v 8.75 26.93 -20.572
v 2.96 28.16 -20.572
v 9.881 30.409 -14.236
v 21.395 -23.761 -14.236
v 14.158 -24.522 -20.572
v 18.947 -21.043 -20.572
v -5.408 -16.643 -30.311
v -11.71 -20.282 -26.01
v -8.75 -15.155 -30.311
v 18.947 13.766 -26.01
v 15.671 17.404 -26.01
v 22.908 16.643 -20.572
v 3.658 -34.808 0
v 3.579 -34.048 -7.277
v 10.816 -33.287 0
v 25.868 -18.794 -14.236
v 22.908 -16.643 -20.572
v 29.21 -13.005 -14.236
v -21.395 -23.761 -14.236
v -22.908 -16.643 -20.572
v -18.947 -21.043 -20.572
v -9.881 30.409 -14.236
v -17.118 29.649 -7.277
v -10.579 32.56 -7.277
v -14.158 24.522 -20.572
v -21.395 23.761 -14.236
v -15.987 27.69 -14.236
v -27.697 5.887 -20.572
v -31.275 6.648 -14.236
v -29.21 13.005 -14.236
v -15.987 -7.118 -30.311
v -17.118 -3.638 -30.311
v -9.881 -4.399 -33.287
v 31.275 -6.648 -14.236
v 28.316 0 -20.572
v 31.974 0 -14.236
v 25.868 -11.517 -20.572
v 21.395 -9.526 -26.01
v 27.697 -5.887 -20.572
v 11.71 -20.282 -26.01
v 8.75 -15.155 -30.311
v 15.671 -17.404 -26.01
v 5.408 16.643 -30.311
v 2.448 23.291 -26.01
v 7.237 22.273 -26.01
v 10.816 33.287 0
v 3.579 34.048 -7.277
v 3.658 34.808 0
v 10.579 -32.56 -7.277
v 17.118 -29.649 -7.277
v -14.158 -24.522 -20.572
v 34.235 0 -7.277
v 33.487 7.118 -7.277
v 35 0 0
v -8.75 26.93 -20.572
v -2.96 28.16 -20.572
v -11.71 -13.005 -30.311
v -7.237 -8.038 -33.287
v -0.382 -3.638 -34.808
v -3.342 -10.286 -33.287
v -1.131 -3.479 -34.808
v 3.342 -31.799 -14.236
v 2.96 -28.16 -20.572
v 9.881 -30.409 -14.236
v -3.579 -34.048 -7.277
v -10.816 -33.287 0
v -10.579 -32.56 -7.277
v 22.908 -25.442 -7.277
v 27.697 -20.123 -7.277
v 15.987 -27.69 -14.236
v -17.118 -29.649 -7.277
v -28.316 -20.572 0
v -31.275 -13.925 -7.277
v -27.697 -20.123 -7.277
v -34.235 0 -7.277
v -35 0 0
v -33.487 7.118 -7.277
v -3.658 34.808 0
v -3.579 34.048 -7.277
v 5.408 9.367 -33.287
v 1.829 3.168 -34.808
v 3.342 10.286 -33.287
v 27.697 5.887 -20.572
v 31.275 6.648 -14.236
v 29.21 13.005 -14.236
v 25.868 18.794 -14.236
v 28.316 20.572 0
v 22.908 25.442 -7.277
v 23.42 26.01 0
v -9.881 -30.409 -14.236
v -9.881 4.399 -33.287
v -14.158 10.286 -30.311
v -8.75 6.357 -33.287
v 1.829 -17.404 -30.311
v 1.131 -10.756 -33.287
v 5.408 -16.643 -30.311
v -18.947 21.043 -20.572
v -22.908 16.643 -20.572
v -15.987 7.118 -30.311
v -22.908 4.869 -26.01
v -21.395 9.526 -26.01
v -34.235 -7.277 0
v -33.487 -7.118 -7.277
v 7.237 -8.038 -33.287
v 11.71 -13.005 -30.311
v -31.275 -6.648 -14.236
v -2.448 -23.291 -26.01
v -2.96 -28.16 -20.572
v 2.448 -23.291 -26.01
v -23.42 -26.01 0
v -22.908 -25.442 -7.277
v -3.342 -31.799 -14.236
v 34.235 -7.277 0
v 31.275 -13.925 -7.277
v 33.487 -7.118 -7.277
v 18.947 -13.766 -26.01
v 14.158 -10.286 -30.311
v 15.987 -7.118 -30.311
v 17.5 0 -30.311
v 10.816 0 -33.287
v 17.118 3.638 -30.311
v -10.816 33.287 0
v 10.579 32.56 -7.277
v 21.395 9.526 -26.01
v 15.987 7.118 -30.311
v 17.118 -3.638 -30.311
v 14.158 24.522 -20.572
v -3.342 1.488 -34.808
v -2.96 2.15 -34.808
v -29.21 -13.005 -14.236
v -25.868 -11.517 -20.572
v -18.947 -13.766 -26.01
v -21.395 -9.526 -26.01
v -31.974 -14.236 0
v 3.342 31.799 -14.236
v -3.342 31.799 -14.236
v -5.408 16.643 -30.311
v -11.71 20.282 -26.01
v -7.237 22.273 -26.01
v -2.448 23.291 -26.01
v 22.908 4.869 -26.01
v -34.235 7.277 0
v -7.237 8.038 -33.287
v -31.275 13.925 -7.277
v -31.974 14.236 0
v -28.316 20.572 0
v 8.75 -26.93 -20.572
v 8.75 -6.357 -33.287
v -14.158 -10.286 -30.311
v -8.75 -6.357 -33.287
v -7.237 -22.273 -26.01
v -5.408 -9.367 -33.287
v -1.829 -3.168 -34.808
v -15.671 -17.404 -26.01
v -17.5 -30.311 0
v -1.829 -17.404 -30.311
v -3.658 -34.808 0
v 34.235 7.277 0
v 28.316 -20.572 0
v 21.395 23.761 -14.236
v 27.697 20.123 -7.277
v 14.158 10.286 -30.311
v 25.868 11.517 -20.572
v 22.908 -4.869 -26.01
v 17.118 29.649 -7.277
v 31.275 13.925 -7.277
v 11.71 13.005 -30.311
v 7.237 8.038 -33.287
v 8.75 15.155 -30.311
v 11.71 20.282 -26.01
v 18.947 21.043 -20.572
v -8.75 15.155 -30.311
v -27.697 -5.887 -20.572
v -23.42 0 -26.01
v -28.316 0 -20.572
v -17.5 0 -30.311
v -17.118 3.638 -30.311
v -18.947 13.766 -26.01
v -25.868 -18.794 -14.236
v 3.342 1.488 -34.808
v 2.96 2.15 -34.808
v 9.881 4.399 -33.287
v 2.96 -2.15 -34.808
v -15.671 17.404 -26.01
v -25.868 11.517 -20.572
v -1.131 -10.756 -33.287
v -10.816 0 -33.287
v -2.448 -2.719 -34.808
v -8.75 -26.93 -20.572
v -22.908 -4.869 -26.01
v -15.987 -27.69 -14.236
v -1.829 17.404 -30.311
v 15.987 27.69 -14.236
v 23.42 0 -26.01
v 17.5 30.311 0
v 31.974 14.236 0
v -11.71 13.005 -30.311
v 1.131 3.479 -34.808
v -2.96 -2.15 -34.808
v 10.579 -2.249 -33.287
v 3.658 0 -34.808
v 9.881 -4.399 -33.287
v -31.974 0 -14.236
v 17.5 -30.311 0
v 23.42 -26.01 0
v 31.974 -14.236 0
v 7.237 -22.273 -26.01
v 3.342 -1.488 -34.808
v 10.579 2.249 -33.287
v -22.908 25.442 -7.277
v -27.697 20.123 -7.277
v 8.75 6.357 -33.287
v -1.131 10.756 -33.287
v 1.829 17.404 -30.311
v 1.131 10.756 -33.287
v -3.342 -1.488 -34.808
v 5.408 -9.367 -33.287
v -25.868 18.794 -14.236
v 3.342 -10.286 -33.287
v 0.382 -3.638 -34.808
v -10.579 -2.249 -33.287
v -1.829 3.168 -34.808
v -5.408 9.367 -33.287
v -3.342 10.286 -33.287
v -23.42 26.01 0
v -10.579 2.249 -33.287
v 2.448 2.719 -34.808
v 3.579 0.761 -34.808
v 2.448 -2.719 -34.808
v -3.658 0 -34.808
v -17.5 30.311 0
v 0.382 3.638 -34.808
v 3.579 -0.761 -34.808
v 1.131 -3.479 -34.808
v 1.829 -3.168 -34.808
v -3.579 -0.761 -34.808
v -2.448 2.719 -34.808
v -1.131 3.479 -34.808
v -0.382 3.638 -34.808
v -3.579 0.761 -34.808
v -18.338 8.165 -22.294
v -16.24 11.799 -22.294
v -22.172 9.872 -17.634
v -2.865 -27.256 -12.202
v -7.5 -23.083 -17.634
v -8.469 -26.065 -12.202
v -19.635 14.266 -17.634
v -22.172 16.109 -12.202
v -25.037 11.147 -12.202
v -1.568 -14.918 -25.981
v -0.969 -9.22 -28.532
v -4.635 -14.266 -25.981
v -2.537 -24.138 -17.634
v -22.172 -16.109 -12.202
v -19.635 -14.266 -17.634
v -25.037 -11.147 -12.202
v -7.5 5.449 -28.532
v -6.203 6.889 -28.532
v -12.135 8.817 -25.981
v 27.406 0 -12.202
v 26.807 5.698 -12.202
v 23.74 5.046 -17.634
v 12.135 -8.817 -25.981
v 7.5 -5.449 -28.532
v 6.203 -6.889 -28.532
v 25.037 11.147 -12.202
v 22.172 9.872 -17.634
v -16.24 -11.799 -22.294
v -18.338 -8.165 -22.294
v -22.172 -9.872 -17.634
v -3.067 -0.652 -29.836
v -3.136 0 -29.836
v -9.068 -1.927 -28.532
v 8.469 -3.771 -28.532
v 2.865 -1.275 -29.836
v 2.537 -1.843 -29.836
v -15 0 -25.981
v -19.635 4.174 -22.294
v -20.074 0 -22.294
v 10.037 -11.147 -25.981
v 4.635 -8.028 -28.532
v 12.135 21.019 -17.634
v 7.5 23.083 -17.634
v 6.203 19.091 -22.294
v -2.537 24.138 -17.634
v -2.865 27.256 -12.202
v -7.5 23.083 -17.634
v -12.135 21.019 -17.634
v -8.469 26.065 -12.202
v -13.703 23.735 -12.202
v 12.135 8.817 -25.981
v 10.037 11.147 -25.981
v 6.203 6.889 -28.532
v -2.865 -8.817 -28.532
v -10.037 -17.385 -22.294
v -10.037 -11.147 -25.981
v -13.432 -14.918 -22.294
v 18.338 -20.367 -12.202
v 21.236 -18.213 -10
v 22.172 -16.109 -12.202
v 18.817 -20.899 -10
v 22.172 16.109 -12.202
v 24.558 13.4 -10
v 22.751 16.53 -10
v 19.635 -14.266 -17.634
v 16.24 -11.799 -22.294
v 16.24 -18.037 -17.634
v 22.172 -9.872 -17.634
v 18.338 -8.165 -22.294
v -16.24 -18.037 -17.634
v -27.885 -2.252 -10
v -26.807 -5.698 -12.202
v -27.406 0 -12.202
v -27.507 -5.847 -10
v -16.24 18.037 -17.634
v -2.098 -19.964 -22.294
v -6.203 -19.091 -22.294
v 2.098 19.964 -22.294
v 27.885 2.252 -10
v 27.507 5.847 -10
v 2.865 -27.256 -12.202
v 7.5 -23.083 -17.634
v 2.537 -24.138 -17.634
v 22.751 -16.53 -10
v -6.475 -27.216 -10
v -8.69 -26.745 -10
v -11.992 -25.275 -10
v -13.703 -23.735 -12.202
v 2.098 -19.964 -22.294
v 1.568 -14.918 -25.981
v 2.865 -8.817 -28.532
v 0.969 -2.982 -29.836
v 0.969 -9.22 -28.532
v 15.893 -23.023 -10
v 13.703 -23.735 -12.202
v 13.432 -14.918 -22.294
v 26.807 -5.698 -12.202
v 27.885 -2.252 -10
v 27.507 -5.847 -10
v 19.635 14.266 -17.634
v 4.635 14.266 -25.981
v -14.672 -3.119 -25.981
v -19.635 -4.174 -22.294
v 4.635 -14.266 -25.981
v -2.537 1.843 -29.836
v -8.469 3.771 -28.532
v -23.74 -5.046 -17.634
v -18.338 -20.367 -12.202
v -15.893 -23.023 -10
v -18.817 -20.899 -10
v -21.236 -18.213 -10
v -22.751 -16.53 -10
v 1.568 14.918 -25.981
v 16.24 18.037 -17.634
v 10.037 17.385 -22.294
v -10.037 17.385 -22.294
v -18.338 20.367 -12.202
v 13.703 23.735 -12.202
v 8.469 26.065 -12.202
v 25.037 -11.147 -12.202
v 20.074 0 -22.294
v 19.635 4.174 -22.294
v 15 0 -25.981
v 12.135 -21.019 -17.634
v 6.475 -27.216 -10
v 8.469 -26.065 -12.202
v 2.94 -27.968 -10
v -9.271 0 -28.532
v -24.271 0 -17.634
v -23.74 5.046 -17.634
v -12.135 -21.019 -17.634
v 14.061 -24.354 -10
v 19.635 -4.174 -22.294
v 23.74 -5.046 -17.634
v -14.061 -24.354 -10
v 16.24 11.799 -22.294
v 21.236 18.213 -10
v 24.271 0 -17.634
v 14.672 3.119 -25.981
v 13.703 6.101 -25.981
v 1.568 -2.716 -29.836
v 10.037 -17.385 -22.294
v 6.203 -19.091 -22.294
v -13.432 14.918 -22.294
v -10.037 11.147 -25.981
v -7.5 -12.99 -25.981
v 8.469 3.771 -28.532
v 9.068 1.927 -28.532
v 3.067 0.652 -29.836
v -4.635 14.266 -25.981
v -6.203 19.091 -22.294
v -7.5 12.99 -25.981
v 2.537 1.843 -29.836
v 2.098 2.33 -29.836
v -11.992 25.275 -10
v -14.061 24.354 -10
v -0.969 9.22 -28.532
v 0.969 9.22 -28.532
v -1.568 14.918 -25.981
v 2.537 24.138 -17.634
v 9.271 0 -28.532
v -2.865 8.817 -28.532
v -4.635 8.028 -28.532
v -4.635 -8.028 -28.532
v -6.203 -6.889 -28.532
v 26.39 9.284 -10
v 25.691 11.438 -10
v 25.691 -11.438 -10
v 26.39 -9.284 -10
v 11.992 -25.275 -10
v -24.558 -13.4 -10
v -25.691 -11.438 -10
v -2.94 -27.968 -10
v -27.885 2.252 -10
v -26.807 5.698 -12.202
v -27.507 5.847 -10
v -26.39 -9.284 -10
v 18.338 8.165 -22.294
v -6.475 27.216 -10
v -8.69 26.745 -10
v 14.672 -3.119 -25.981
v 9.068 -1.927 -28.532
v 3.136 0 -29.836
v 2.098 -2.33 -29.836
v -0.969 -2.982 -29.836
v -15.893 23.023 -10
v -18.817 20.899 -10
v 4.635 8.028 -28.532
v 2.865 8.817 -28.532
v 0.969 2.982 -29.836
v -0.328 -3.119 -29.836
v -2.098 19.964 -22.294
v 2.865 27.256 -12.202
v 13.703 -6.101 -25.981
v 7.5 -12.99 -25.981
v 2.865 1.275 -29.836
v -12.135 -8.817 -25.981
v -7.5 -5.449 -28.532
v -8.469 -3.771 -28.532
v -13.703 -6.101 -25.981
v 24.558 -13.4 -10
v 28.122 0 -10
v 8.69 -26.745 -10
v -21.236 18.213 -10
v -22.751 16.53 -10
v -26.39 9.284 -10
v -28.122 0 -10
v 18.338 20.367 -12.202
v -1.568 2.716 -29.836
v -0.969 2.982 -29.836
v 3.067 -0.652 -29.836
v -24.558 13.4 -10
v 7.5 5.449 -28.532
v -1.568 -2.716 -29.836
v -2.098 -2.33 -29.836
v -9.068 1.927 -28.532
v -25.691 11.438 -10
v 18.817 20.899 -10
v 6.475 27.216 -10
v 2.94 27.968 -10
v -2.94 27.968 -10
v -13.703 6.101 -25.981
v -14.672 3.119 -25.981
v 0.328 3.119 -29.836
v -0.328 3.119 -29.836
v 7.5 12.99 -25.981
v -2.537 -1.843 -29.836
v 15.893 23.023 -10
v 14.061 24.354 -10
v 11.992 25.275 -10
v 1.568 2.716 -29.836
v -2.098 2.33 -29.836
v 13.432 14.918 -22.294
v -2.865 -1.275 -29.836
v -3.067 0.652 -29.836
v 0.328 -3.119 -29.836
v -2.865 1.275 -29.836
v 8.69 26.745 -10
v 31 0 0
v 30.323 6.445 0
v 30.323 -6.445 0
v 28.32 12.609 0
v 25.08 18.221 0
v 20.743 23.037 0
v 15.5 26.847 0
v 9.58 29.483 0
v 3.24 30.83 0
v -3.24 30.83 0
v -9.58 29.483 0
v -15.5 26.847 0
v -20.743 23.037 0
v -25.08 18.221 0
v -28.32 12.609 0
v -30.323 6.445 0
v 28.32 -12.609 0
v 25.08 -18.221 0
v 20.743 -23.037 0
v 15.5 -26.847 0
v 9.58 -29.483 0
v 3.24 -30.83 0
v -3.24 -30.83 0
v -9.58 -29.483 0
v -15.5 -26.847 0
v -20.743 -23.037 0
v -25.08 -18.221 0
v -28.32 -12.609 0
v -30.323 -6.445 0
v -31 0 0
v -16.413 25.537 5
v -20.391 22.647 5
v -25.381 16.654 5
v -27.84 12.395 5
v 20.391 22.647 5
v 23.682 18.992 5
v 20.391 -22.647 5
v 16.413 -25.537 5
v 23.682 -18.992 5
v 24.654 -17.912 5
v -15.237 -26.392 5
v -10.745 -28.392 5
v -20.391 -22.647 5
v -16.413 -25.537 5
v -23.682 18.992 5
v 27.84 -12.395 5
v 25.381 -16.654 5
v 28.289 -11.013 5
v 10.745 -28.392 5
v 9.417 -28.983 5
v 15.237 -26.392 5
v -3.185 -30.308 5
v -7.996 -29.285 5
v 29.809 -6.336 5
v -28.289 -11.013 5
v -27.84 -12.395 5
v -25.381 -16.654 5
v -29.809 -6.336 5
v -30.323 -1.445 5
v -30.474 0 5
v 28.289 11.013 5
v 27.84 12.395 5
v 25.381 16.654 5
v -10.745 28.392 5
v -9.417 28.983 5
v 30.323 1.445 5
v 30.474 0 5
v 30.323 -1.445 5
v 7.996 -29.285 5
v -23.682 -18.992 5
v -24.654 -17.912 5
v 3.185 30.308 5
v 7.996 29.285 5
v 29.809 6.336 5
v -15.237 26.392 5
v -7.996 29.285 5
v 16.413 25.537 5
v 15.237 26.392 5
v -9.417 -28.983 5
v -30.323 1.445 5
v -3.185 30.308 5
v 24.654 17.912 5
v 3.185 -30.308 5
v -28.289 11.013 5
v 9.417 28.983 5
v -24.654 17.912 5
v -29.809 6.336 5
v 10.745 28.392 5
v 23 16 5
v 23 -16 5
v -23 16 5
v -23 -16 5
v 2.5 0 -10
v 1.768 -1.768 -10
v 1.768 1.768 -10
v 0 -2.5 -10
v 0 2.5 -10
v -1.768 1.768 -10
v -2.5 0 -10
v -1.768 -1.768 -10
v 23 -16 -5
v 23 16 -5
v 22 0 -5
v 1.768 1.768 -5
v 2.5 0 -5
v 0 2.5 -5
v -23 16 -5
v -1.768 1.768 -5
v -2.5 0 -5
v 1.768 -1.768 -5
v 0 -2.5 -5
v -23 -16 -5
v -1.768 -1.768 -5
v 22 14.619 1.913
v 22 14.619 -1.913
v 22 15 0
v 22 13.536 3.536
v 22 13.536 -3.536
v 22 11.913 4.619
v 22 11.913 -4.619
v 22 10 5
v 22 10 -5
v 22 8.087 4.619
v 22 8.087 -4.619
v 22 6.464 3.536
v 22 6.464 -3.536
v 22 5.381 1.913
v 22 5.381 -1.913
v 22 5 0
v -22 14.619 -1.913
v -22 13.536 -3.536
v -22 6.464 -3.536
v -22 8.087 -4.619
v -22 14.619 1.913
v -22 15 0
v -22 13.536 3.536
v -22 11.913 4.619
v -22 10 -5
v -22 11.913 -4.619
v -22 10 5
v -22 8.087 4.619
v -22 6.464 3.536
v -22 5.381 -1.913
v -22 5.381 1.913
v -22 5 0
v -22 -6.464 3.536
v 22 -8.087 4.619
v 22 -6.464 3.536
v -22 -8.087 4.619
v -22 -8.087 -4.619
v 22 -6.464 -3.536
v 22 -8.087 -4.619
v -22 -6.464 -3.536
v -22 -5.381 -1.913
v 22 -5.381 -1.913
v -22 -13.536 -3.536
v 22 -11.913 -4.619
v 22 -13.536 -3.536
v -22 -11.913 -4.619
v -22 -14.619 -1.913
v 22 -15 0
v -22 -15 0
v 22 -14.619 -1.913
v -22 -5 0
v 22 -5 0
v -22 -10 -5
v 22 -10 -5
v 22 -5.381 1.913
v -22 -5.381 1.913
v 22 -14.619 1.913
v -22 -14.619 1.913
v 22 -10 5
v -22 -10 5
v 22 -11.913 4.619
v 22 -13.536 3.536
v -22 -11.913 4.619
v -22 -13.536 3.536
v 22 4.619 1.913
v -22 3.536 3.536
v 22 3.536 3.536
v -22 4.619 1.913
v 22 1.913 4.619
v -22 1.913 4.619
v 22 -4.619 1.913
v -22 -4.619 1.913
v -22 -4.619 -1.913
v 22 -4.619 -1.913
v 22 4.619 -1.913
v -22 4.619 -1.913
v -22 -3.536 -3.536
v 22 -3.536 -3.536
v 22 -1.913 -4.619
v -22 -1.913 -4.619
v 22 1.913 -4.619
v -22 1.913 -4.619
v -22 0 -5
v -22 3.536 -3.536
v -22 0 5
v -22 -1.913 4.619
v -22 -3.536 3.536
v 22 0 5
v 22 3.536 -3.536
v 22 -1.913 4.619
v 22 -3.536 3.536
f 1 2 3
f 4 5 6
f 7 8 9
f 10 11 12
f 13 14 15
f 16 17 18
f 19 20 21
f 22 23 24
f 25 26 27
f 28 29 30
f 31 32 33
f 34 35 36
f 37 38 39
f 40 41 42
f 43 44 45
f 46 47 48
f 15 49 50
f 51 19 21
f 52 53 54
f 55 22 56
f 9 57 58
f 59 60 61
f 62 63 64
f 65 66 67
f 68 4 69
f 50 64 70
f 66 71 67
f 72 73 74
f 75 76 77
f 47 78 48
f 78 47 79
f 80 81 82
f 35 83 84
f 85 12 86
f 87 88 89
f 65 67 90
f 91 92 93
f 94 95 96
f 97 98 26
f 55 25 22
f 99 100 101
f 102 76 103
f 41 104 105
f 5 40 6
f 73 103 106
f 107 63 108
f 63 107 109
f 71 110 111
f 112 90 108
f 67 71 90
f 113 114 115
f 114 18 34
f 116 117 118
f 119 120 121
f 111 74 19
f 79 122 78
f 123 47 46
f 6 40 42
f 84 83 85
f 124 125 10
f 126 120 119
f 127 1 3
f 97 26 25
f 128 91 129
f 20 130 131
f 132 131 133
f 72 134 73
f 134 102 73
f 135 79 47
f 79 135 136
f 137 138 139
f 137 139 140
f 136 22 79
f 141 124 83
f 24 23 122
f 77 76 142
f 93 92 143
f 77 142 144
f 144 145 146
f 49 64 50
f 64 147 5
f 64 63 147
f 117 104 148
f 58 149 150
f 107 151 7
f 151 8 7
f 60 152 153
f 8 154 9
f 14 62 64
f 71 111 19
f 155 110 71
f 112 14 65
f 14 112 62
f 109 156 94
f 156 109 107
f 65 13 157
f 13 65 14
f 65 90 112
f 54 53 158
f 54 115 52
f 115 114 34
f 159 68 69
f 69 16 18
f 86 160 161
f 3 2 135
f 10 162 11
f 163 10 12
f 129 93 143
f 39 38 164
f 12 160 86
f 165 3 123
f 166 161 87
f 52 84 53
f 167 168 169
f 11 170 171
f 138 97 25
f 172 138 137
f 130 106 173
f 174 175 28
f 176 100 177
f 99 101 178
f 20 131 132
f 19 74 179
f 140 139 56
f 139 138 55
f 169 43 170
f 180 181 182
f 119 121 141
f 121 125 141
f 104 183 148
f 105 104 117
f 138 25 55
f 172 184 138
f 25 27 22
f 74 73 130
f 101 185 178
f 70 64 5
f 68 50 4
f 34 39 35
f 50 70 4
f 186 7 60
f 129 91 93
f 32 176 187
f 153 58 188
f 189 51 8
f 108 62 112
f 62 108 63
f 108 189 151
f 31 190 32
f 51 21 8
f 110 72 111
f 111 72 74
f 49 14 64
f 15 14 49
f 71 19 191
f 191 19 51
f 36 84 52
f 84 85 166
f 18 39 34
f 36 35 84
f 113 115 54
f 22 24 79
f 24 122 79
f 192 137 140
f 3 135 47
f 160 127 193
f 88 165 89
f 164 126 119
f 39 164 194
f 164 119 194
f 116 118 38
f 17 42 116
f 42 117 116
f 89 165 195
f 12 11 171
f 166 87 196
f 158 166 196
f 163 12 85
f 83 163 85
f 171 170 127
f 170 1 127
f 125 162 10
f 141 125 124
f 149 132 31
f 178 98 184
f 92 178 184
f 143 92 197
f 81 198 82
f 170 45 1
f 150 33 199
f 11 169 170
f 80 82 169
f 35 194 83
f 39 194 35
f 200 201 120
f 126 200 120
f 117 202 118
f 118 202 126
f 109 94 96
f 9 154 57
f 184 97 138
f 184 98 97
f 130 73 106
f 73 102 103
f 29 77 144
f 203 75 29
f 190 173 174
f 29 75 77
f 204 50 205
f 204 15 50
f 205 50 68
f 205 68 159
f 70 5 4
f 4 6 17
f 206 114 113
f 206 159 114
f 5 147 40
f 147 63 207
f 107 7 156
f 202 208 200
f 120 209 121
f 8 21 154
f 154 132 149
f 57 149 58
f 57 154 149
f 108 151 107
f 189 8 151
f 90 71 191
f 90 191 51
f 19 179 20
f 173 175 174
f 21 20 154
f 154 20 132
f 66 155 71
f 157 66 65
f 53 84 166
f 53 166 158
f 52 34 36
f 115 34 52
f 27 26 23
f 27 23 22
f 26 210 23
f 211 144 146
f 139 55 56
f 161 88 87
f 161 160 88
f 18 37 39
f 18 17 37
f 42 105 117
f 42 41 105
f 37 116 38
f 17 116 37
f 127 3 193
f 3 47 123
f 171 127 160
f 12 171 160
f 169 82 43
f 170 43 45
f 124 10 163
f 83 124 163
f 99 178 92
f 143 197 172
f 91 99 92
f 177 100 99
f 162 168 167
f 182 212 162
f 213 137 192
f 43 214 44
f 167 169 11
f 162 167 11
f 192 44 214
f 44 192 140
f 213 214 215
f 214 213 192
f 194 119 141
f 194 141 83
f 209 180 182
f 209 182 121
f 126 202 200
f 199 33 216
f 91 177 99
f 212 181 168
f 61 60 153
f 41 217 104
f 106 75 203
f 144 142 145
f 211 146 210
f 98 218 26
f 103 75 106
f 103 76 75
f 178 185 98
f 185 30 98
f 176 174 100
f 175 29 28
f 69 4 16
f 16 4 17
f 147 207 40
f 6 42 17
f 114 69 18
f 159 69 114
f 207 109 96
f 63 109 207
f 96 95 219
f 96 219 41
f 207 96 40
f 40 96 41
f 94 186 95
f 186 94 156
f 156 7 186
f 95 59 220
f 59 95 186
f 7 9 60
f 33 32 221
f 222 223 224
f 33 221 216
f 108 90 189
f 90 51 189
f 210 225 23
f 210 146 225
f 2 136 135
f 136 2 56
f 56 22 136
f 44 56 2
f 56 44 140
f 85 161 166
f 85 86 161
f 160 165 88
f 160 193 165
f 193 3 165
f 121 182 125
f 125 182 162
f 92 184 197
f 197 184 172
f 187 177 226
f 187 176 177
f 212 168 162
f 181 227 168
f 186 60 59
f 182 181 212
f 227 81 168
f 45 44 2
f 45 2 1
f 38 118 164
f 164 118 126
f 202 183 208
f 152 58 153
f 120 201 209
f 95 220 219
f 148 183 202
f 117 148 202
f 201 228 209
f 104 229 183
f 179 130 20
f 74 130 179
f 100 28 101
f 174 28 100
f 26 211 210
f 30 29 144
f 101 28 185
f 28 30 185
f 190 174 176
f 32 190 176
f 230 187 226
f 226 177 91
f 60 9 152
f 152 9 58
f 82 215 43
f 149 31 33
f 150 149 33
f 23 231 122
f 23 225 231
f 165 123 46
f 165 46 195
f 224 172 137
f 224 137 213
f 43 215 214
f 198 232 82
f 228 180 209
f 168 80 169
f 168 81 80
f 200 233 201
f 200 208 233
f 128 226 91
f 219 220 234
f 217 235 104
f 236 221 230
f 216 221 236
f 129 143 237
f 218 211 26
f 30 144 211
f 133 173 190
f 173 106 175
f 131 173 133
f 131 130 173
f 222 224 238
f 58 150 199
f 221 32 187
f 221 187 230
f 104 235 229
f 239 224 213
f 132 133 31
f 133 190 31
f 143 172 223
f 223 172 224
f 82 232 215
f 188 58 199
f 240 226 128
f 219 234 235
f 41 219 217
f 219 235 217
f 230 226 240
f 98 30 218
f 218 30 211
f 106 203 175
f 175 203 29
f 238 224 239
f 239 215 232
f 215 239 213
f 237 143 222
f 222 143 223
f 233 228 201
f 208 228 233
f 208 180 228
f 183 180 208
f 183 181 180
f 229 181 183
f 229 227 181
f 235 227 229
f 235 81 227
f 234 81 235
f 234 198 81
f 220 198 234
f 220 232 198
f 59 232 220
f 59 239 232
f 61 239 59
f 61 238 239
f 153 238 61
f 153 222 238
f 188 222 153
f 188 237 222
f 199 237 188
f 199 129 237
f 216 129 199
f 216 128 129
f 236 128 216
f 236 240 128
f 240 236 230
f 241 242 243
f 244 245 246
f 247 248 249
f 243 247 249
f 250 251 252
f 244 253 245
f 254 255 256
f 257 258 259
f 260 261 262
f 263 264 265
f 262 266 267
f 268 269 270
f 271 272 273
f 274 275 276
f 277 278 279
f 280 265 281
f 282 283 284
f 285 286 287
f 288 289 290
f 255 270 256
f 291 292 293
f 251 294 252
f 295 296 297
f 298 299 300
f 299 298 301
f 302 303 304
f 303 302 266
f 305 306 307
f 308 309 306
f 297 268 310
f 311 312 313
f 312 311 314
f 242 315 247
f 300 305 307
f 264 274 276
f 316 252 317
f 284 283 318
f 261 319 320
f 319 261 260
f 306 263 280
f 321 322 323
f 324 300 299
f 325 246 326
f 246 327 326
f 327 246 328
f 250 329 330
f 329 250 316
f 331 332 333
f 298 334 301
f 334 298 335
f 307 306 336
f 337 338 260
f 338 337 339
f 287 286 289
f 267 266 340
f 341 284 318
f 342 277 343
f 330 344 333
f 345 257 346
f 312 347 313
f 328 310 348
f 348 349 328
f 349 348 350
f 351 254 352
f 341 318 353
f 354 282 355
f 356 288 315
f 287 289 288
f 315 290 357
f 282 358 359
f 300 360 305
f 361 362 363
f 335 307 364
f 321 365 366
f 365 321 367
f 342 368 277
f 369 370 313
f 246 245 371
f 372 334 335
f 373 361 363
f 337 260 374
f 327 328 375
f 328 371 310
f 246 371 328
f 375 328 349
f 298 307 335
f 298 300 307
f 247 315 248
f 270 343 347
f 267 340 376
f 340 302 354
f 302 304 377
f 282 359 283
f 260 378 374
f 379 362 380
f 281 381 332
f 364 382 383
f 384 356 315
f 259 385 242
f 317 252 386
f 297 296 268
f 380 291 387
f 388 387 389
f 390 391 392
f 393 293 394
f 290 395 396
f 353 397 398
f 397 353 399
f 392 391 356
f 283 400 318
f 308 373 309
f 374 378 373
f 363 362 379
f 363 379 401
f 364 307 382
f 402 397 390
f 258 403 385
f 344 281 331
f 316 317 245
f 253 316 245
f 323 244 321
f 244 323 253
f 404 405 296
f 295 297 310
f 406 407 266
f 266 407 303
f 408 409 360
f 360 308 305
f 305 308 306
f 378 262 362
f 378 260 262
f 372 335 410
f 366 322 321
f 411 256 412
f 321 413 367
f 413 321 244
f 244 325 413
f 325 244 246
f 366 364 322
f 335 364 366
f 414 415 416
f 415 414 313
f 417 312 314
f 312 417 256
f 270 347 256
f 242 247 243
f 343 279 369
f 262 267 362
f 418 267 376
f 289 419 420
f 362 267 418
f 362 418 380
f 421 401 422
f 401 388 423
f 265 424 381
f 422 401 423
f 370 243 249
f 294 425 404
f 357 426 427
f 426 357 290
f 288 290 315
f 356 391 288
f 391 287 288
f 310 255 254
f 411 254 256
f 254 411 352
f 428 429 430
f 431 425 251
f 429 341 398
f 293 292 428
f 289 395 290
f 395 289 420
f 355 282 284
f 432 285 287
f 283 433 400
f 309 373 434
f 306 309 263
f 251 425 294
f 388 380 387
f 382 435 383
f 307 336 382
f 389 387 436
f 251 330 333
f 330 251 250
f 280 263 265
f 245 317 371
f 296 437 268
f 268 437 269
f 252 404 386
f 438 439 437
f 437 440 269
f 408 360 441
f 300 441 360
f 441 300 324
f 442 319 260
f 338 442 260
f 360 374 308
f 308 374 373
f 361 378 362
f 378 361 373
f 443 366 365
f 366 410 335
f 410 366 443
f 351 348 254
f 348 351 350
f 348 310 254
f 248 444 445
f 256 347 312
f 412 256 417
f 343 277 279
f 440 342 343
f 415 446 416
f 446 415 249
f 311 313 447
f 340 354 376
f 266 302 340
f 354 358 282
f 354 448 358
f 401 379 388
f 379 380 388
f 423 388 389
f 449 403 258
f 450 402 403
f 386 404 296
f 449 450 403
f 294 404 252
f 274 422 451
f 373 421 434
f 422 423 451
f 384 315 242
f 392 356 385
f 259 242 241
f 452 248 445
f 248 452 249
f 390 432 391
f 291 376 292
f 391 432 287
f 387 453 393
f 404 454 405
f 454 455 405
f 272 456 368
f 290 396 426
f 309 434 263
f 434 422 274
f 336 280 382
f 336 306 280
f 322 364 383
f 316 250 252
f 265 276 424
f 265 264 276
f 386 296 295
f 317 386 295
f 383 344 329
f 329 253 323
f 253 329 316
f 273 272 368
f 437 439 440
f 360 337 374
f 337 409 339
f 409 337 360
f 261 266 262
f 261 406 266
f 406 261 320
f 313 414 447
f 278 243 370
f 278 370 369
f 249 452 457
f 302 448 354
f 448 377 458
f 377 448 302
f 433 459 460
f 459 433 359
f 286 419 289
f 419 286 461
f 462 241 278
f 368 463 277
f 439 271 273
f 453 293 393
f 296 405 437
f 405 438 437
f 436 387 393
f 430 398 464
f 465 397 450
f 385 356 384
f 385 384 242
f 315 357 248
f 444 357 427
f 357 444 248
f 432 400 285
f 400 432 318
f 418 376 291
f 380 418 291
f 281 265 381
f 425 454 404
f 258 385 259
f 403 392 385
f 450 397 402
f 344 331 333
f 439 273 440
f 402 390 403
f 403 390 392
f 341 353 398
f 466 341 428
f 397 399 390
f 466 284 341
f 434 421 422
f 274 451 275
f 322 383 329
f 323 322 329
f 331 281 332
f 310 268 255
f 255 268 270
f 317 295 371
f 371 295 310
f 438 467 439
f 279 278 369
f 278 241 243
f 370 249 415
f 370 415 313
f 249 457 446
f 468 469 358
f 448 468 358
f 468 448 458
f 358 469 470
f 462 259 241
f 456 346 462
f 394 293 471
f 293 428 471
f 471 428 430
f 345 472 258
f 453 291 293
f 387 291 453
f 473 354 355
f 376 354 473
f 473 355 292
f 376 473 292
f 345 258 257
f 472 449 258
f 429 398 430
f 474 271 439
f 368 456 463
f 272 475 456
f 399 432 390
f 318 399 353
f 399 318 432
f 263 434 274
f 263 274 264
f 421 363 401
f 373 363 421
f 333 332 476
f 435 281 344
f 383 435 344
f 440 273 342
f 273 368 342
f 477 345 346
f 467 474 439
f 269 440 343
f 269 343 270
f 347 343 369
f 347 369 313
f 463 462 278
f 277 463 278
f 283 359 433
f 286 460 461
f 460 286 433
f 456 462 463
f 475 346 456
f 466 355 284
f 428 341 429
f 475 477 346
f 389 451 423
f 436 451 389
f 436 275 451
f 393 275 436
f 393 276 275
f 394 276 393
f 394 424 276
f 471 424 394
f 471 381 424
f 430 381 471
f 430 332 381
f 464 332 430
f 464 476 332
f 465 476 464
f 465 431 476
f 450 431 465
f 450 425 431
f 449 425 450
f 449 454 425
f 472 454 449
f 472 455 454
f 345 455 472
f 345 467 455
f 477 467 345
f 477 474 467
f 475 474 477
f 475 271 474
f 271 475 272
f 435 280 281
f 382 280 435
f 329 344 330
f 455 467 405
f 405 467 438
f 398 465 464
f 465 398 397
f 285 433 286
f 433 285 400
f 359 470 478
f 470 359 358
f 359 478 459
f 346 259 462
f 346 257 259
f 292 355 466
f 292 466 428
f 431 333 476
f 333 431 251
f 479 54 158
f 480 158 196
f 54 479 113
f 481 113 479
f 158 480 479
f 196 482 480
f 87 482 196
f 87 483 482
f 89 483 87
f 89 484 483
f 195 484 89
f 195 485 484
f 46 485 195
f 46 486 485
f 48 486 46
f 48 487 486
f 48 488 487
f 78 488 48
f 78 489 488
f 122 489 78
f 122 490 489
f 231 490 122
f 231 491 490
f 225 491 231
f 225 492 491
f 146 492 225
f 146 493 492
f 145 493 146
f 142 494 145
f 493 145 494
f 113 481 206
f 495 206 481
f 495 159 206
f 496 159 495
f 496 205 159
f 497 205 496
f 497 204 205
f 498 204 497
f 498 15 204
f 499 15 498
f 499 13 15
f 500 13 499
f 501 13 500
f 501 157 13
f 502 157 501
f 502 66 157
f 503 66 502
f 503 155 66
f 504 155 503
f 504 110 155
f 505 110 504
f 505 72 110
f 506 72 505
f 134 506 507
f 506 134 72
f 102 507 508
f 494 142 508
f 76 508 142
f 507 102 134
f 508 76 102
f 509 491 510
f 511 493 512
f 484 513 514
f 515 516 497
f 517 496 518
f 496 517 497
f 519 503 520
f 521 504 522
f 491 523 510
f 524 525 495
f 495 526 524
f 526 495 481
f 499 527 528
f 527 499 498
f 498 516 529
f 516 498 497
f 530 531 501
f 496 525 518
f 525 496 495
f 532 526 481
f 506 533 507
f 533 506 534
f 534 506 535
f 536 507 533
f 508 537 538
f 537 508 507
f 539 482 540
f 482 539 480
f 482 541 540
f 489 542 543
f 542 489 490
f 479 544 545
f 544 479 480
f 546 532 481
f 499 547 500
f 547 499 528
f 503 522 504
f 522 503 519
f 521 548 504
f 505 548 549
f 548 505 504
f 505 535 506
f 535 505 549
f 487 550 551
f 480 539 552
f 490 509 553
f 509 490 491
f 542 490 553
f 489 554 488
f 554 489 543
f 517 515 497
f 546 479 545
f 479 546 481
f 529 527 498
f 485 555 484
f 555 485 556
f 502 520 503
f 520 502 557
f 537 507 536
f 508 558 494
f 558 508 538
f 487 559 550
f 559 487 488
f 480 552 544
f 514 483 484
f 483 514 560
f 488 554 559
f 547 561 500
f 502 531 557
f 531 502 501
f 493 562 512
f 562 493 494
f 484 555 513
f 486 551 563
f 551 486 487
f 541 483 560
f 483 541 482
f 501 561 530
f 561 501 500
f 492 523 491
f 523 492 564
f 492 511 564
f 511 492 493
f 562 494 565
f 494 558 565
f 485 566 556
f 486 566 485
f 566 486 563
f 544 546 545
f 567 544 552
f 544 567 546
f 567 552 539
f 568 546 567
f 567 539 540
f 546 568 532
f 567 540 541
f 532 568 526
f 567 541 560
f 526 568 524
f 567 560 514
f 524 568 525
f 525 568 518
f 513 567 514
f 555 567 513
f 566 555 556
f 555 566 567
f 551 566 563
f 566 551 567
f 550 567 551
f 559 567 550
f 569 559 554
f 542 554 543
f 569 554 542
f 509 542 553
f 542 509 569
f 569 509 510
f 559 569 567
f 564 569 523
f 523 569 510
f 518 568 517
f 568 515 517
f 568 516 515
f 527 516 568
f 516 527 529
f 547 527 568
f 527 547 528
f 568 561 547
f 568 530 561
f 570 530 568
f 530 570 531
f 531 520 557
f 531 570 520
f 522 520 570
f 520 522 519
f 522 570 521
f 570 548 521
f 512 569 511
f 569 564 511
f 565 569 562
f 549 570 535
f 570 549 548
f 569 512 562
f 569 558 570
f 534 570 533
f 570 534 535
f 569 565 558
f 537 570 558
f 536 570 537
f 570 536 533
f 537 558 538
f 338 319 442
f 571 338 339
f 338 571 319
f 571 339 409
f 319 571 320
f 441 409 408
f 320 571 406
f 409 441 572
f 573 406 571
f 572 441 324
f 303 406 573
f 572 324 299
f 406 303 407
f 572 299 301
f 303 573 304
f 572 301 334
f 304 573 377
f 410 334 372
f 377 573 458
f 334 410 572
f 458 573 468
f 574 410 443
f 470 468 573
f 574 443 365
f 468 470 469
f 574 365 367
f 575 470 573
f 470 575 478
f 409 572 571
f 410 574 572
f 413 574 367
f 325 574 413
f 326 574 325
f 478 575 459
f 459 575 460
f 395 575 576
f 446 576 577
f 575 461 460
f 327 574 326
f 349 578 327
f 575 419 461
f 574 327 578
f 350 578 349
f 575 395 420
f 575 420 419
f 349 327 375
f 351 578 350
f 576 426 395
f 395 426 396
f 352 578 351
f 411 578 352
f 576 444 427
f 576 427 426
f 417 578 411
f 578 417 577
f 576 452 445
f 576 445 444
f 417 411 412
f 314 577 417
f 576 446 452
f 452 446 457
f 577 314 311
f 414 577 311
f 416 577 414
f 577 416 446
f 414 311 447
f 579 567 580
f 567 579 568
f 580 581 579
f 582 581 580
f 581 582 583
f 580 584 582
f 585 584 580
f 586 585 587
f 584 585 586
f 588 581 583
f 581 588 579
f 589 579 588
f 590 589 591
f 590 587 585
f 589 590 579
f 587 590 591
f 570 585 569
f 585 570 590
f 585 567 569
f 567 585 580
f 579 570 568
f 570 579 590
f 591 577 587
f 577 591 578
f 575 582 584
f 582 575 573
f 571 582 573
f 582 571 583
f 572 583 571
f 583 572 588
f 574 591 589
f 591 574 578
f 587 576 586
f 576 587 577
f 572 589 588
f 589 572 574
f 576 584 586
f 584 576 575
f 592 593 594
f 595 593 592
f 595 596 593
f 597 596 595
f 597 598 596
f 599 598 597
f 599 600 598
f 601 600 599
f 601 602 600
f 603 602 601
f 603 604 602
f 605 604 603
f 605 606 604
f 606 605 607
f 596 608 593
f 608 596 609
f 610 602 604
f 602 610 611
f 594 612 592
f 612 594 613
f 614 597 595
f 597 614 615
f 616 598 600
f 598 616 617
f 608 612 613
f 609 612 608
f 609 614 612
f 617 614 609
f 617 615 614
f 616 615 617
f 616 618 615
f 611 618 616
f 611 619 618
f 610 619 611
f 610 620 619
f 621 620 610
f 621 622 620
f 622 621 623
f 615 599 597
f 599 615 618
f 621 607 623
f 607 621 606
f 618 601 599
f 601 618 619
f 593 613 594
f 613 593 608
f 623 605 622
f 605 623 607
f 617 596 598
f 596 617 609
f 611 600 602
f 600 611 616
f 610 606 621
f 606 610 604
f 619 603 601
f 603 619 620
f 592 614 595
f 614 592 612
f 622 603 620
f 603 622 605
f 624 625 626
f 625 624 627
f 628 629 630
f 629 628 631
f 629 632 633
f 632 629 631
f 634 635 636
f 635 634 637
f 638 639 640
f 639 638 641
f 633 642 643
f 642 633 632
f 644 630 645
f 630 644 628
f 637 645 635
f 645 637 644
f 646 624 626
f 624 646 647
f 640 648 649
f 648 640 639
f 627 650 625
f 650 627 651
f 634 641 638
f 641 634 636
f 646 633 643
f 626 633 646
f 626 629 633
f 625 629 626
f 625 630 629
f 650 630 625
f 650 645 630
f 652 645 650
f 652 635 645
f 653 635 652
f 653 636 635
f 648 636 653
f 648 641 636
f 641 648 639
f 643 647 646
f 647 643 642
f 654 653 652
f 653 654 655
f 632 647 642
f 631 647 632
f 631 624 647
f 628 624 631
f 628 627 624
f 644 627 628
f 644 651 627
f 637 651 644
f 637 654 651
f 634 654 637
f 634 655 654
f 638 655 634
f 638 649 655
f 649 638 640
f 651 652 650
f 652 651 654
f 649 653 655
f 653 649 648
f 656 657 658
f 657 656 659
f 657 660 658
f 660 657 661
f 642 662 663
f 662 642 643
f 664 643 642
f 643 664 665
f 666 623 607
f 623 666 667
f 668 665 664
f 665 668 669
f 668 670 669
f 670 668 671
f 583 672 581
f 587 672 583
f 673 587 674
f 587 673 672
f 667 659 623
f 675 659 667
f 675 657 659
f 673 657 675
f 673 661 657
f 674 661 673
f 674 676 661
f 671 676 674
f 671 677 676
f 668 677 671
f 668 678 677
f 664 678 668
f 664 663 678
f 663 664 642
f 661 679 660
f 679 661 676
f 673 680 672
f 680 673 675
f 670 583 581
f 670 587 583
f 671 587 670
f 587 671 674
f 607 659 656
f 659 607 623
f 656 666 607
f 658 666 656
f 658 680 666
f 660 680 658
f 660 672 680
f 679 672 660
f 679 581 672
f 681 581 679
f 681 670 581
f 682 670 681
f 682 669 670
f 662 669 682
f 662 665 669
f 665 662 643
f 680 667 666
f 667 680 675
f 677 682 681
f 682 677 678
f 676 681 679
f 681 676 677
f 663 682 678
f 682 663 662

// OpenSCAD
mysize = 35;
thickness = 5;
batteryLength = 44;
batteryRadius = 5;
batteryDelta = 2;

module halfBall()
{
	difference() {
		sphere(r = mysize);
		sphere(r = mysize - thickness);
		translate([0, 0, mysize]) cube([mysize * 2, mysize * 2, mysize * 2], center = true);
	}
}

module electronicsHolder()
{
	difference () {
		translate([0, 0, -thickness / 2]) cube([mysize * 2, 80, thickness + (batteryRadius * 2)], center = true);
		translate([0, 0, 5]) cube([batteryLength + batteryDelta, batteryRadius * 2 * 3 + batteryDelta, (batteryRadius * 2) + 10], center = true);
		difference() {
			sphere(r = mysize * 2);
			sphere(r = mysize - thickness + 1);
			//translate([0, 0, mysize]) cube([mysize * 2, mysize * 2, mysize * 2], center = true);
		}
		cylinder(h = ((batteryRadius * 2 + thickness) * 2), r = 2.5, center = true);
	}
}

module battery()
{
	cylinder(h = batteryLength, r = batteryRadius);
}

union()
{
	halfBall();
	electronicsHolder();
// battery
	translate([-22, 10, 0]) rotate(a=[0, 90, 0]) battery();
	translate([-22, -10, 0]) rotate(a=[0, 90, 0]) battery();
	translate([-22, 0, 0]) rotate(a=[0, 90, 0]) battery();
}
